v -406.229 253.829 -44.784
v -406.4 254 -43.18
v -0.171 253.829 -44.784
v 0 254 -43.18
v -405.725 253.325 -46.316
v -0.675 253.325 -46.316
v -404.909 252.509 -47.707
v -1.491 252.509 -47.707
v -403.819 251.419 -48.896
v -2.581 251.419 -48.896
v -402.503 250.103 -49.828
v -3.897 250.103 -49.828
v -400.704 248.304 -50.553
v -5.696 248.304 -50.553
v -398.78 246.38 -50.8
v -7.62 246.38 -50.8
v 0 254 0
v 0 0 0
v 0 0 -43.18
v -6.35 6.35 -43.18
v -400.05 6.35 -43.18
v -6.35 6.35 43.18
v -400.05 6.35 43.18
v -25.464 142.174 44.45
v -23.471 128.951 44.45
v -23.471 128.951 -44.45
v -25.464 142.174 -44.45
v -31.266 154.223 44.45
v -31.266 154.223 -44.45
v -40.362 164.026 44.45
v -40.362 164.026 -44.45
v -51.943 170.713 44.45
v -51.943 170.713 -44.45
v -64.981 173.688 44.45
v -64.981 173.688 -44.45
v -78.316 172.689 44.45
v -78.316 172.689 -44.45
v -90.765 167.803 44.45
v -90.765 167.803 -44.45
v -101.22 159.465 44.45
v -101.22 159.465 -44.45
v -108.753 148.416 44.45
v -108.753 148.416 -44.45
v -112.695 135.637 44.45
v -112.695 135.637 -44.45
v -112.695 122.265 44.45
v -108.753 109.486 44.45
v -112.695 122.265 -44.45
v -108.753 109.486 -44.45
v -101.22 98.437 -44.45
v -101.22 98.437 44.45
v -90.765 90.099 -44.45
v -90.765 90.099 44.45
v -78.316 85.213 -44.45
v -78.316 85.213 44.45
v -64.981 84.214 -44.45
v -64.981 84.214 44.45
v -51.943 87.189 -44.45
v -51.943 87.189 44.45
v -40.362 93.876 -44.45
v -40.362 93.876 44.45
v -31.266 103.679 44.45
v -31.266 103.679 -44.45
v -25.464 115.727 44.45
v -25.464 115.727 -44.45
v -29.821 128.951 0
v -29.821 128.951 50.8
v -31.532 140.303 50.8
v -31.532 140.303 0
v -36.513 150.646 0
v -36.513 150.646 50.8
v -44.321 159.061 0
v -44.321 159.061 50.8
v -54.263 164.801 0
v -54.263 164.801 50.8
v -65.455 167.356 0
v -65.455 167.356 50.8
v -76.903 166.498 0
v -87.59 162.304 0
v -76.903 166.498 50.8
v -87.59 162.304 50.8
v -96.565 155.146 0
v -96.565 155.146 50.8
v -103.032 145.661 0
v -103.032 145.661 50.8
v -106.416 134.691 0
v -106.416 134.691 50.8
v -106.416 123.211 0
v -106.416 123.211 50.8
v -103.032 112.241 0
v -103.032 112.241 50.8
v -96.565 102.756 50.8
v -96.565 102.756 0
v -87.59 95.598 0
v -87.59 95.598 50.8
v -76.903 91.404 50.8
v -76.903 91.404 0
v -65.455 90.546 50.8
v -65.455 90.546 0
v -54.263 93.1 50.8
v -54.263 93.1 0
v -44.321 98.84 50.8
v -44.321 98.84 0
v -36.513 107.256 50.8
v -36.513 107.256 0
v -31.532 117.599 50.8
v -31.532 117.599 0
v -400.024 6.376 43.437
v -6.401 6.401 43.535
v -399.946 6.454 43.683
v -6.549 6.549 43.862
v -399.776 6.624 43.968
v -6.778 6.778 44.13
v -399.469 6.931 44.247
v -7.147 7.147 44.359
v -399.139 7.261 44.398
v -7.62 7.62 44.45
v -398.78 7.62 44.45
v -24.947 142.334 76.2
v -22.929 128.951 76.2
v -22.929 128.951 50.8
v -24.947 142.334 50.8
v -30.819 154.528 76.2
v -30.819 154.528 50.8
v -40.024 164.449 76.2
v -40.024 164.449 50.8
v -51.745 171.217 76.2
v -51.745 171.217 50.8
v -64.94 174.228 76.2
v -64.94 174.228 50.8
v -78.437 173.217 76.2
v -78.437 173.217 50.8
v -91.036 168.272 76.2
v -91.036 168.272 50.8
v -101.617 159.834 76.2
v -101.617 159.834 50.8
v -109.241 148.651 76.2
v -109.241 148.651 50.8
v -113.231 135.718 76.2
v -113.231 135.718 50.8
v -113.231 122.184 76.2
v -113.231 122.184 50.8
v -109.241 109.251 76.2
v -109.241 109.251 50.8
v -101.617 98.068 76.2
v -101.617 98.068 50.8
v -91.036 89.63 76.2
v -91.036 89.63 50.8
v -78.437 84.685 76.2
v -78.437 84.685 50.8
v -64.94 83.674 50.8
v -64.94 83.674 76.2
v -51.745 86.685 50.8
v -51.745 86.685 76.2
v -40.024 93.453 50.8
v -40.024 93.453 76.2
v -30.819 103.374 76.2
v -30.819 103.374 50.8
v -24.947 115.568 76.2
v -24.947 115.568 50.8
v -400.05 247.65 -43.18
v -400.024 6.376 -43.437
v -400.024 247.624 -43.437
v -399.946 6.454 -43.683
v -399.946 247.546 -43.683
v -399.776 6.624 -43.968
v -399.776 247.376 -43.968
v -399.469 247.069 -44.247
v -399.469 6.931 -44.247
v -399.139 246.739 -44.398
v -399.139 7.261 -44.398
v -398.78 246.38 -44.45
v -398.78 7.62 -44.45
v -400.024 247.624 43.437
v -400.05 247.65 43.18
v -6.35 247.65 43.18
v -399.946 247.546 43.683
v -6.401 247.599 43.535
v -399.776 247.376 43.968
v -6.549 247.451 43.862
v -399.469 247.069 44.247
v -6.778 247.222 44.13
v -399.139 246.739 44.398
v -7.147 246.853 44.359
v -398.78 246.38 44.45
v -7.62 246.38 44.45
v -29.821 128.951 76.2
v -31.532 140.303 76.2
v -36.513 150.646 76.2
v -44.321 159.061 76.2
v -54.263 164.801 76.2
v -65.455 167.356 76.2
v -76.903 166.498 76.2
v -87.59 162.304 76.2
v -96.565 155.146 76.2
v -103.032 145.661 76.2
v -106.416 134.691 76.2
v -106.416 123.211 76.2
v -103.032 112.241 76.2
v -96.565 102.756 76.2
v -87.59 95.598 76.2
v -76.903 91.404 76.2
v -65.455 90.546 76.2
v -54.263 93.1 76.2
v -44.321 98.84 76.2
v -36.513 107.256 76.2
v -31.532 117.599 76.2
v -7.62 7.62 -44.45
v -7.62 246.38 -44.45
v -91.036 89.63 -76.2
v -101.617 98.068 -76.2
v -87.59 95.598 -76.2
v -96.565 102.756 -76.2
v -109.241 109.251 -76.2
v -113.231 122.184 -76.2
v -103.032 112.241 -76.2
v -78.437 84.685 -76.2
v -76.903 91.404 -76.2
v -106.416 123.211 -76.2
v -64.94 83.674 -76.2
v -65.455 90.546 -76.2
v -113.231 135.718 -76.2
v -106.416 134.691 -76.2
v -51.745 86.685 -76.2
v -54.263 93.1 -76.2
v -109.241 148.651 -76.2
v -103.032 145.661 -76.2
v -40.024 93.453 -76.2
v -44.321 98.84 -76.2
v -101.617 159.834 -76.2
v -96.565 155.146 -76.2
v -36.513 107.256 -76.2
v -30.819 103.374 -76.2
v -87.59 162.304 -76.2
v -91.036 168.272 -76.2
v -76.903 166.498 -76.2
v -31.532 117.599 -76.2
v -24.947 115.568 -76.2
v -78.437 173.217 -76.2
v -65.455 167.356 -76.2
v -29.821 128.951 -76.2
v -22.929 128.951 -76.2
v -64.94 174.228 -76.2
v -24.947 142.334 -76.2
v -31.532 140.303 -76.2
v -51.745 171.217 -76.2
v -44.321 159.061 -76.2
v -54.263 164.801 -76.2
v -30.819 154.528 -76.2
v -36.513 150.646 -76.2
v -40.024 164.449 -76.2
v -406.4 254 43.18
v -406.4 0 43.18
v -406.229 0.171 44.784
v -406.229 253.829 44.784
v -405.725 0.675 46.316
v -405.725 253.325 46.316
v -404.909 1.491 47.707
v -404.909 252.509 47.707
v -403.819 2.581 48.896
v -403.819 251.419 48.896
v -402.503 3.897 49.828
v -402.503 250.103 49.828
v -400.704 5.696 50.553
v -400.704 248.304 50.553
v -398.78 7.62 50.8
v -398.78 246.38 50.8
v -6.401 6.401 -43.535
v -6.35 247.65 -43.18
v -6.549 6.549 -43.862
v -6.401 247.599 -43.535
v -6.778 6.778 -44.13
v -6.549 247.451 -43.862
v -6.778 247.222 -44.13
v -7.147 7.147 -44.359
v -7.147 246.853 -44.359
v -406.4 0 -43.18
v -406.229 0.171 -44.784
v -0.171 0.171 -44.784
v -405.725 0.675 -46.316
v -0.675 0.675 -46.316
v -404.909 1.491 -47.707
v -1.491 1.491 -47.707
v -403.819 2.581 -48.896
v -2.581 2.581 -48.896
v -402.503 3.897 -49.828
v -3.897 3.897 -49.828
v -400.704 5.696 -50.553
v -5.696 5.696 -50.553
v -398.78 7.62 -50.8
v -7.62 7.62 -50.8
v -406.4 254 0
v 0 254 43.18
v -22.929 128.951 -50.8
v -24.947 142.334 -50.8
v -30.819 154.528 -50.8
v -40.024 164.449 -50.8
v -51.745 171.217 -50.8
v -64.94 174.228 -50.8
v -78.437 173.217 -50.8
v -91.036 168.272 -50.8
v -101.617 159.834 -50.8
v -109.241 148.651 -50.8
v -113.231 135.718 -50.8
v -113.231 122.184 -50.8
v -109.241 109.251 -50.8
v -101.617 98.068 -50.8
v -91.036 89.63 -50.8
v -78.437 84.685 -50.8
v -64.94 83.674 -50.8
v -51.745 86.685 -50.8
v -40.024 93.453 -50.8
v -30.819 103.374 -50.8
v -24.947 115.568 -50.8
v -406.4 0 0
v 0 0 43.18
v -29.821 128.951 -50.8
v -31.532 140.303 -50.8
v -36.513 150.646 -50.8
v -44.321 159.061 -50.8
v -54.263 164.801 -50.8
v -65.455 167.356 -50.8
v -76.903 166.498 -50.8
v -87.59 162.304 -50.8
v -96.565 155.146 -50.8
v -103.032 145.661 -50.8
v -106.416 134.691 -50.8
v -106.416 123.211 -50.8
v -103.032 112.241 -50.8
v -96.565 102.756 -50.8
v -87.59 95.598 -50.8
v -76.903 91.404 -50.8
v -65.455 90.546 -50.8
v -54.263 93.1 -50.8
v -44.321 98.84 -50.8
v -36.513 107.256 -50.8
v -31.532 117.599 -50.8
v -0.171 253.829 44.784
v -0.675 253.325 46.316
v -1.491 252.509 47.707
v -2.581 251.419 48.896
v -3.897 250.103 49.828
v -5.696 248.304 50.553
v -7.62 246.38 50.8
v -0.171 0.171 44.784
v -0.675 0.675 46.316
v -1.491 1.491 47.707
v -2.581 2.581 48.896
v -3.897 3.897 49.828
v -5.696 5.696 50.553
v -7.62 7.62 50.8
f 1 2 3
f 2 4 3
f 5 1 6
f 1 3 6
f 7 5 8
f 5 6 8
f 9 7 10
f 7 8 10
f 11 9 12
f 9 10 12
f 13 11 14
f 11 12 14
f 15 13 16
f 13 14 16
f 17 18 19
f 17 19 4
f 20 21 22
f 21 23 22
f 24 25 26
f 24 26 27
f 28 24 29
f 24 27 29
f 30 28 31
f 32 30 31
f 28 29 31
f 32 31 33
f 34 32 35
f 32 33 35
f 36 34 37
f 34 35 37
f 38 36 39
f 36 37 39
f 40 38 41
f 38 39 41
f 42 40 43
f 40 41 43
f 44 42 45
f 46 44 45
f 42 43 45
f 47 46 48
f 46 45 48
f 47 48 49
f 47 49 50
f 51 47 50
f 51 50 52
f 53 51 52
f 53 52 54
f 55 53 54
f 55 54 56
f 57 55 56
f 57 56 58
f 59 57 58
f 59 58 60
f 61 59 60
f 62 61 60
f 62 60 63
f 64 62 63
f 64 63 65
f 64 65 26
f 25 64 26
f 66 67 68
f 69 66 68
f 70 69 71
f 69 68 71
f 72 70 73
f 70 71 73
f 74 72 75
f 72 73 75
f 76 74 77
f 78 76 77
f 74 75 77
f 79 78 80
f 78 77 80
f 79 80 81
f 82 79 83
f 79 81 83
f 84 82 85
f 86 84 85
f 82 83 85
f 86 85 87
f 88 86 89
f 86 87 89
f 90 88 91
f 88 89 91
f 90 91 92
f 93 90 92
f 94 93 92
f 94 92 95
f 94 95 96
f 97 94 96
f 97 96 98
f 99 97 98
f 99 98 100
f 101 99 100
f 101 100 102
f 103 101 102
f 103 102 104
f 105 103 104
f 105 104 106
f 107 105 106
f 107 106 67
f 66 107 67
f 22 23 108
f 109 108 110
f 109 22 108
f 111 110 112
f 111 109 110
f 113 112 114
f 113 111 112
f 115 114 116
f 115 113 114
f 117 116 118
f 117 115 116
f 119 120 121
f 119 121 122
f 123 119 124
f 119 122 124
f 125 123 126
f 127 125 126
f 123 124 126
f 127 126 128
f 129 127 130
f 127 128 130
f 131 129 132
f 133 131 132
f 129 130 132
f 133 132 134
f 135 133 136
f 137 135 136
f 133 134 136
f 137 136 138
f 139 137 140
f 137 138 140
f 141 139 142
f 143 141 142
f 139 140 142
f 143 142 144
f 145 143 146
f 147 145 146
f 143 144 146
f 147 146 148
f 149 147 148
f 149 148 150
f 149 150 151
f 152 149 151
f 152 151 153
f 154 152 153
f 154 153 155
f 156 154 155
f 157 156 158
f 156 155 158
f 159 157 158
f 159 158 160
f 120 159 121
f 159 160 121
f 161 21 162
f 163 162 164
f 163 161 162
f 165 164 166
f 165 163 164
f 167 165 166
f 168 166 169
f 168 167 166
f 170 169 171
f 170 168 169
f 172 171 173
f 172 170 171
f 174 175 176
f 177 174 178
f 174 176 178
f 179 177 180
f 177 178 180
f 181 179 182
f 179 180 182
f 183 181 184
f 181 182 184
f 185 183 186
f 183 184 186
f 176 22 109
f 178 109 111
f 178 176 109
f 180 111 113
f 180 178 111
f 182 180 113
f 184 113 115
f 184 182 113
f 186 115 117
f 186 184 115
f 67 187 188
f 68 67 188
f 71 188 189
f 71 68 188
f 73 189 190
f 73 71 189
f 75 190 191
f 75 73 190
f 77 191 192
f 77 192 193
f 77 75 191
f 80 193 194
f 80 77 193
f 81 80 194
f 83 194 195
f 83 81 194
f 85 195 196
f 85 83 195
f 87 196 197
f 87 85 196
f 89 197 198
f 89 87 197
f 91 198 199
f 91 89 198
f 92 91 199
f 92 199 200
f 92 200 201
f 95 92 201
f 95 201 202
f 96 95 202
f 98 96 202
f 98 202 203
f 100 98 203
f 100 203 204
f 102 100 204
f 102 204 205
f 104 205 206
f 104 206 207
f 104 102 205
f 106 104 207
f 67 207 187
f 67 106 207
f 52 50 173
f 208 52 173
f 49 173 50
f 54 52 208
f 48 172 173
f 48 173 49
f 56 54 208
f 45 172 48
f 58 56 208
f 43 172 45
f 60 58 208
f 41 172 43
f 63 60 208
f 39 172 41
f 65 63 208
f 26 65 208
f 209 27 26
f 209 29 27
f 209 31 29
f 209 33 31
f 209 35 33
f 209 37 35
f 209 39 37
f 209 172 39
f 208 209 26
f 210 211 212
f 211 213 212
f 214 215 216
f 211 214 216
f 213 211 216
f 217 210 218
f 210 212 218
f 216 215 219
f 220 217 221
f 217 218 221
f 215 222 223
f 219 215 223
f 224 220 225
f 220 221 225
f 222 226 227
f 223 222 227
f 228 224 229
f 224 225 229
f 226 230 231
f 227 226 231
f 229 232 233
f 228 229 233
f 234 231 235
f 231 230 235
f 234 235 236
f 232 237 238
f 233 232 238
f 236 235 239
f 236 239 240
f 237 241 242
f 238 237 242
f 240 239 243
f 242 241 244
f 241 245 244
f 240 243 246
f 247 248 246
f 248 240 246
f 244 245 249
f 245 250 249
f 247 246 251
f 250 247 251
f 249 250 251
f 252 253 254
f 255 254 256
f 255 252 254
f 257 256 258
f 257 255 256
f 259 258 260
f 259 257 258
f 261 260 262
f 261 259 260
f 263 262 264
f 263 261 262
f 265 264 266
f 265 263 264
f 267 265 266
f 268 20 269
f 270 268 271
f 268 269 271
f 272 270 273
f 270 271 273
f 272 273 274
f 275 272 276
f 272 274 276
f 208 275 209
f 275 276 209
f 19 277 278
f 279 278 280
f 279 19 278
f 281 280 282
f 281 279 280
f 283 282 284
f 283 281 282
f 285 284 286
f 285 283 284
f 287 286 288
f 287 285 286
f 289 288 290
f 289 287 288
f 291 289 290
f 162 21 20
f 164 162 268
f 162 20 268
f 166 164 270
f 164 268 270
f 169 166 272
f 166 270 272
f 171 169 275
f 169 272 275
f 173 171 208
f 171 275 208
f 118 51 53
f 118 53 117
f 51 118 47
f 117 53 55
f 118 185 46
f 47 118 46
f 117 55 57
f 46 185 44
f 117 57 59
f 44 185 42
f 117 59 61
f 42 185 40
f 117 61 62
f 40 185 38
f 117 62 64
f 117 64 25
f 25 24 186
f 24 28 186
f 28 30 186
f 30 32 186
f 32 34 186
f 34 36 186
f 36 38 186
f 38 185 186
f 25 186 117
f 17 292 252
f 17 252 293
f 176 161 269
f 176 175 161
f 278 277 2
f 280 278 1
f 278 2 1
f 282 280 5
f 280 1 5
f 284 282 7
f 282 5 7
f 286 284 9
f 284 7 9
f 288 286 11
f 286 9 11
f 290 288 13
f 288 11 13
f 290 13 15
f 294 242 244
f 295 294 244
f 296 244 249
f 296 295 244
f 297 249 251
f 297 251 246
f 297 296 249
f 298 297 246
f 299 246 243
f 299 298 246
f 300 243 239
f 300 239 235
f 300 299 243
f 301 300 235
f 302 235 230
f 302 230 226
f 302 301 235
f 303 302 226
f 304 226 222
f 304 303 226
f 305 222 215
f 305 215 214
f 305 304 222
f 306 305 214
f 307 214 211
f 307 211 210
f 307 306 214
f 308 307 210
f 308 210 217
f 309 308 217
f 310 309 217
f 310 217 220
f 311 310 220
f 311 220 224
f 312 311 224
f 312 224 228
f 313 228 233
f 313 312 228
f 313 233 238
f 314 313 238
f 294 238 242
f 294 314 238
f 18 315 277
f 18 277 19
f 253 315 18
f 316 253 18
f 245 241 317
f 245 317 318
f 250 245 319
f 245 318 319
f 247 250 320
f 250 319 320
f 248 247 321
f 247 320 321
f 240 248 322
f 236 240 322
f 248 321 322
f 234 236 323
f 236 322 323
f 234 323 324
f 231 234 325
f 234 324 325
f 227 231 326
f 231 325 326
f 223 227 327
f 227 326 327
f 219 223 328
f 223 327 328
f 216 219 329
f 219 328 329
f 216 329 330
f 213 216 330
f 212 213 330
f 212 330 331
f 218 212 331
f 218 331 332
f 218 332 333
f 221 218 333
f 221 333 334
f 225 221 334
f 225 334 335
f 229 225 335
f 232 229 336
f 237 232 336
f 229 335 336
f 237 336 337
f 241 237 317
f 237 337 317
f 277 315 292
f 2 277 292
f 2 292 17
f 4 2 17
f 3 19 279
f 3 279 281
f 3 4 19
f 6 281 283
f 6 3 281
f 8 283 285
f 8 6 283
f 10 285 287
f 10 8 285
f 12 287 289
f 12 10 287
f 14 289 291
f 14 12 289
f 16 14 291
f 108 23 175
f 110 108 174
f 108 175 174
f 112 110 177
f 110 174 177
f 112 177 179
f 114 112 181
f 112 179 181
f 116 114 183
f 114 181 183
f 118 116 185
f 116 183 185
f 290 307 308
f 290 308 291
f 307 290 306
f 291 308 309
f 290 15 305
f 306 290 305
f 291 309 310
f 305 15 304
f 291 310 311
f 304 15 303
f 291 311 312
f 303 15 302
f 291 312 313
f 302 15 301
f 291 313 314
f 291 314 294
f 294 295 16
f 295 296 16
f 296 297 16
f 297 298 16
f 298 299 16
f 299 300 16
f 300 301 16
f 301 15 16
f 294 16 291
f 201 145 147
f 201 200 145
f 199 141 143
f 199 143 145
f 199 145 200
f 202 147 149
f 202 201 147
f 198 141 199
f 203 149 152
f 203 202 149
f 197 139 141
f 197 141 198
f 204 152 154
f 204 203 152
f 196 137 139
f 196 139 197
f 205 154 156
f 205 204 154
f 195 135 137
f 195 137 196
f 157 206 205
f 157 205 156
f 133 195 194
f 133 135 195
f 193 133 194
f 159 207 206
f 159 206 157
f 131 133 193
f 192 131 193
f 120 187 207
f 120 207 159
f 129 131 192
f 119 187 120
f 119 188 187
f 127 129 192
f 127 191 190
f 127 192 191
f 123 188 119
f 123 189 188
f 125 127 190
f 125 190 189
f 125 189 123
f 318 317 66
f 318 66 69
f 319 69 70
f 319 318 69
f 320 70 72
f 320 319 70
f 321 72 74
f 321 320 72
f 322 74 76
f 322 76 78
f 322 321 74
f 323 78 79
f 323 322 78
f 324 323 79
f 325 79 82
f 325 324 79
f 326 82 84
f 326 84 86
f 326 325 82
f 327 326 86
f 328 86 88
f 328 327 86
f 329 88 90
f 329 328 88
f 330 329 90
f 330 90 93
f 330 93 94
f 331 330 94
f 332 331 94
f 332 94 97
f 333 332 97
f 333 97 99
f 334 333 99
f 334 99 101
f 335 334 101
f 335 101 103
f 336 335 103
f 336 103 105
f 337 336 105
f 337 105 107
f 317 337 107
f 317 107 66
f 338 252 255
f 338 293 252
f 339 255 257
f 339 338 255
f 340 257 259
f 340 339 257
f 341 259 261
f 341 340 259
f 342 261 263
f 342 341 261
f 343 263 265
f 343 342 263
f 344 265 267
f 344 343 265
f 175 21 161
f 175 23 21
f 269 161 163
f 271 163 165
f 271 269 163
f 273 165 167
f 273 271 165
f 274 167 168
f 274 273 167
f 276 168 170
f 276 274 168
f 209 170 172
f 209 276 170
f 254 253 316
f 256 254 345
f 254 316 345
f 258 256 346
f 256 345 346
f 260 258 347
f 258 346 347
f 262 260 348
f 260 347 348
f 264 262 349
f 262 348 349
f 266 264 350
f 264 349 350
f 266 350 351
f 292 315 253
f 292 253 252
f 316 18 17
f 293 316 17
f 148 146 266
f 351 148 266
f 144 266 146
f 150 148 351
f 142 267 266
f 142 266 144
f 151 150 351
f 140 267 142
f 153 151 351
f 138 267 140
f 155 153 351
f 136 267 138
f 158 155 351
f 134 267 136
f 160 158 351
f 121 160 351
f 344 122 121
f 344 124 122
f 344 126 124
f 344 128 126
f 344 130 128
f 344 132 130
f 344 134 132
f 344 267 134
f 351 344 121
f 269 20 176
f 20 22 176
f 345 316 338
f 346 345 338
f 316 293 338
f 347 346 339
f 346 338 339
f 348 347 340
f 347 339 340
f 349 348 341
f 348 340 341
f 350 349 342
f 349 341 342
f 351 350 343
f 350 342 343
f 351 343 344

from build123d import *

# Parameters (mm, degrees)
F0_W     = 406.4
F0_H     = 254
F1_DEPTH = 50.8
F2_R     = 7.62
F3_R     = 38.512752
F4_DEPTH = 50.801
F5_T     = -6.35
F6_R     = 45.404172
F6_R_2   = 38.512752
F7_DEPTH = 25.4


with BuildPart() as f1:
    # F0 (on Top) → F1 (new body)
    with BuildSketch(Plane.XY):
        with Locations((-203.2, 127)):
            Rectangle(F0_W, F0_H)
    extrude(amount=F1_DEPTH)

    # F2
    f2_edges = [f1.edges().sort_by_distance(p)[0] for p in [
        (-406.4, 127, 50.8),
        (-203.2, 0, 50.8),
        (0, 127, 50.8),
        (-203.2, 254, 50.8),
    ]]
    fillet(f2_edges, radius=F2_R)

    # F3 (on face) → F4 (cut, through all)
    with BuildSketch(Plane.XY.offset(50.8)):
        with Locations((-68.333499, 128.950953)):
            Circle(F3_R)
    extrude(amount=-F4_DEPTH, mode=Mode.SUBTRACT)

    # F5
    f5_openings = [f1.faces().sort_by_distance(p)[0] for p in [
        (-209.575826, 126.907769, 0),
    ]]
    offset(amount=F5_T, openings=f5_openings)

    # F6 (on face) → F7 (join)
    with BuildSketch(Plane.XY.offset(50.8)):
        with Locations((-68.333499, 128.950953)):
            Circle(F6_R)
        with Locations((-68.333499, 128.950953)):
            Circle(F6_R_2, mode=Mode.SUBTRACT)
    extrude(amount=F7_DEPTH)

    # F8: F1 across plane


with BuildPart() as f1_1:
    add(f1.part)
    add(f1.part.mirror(Plane.XY))


solid = f1_1.part
